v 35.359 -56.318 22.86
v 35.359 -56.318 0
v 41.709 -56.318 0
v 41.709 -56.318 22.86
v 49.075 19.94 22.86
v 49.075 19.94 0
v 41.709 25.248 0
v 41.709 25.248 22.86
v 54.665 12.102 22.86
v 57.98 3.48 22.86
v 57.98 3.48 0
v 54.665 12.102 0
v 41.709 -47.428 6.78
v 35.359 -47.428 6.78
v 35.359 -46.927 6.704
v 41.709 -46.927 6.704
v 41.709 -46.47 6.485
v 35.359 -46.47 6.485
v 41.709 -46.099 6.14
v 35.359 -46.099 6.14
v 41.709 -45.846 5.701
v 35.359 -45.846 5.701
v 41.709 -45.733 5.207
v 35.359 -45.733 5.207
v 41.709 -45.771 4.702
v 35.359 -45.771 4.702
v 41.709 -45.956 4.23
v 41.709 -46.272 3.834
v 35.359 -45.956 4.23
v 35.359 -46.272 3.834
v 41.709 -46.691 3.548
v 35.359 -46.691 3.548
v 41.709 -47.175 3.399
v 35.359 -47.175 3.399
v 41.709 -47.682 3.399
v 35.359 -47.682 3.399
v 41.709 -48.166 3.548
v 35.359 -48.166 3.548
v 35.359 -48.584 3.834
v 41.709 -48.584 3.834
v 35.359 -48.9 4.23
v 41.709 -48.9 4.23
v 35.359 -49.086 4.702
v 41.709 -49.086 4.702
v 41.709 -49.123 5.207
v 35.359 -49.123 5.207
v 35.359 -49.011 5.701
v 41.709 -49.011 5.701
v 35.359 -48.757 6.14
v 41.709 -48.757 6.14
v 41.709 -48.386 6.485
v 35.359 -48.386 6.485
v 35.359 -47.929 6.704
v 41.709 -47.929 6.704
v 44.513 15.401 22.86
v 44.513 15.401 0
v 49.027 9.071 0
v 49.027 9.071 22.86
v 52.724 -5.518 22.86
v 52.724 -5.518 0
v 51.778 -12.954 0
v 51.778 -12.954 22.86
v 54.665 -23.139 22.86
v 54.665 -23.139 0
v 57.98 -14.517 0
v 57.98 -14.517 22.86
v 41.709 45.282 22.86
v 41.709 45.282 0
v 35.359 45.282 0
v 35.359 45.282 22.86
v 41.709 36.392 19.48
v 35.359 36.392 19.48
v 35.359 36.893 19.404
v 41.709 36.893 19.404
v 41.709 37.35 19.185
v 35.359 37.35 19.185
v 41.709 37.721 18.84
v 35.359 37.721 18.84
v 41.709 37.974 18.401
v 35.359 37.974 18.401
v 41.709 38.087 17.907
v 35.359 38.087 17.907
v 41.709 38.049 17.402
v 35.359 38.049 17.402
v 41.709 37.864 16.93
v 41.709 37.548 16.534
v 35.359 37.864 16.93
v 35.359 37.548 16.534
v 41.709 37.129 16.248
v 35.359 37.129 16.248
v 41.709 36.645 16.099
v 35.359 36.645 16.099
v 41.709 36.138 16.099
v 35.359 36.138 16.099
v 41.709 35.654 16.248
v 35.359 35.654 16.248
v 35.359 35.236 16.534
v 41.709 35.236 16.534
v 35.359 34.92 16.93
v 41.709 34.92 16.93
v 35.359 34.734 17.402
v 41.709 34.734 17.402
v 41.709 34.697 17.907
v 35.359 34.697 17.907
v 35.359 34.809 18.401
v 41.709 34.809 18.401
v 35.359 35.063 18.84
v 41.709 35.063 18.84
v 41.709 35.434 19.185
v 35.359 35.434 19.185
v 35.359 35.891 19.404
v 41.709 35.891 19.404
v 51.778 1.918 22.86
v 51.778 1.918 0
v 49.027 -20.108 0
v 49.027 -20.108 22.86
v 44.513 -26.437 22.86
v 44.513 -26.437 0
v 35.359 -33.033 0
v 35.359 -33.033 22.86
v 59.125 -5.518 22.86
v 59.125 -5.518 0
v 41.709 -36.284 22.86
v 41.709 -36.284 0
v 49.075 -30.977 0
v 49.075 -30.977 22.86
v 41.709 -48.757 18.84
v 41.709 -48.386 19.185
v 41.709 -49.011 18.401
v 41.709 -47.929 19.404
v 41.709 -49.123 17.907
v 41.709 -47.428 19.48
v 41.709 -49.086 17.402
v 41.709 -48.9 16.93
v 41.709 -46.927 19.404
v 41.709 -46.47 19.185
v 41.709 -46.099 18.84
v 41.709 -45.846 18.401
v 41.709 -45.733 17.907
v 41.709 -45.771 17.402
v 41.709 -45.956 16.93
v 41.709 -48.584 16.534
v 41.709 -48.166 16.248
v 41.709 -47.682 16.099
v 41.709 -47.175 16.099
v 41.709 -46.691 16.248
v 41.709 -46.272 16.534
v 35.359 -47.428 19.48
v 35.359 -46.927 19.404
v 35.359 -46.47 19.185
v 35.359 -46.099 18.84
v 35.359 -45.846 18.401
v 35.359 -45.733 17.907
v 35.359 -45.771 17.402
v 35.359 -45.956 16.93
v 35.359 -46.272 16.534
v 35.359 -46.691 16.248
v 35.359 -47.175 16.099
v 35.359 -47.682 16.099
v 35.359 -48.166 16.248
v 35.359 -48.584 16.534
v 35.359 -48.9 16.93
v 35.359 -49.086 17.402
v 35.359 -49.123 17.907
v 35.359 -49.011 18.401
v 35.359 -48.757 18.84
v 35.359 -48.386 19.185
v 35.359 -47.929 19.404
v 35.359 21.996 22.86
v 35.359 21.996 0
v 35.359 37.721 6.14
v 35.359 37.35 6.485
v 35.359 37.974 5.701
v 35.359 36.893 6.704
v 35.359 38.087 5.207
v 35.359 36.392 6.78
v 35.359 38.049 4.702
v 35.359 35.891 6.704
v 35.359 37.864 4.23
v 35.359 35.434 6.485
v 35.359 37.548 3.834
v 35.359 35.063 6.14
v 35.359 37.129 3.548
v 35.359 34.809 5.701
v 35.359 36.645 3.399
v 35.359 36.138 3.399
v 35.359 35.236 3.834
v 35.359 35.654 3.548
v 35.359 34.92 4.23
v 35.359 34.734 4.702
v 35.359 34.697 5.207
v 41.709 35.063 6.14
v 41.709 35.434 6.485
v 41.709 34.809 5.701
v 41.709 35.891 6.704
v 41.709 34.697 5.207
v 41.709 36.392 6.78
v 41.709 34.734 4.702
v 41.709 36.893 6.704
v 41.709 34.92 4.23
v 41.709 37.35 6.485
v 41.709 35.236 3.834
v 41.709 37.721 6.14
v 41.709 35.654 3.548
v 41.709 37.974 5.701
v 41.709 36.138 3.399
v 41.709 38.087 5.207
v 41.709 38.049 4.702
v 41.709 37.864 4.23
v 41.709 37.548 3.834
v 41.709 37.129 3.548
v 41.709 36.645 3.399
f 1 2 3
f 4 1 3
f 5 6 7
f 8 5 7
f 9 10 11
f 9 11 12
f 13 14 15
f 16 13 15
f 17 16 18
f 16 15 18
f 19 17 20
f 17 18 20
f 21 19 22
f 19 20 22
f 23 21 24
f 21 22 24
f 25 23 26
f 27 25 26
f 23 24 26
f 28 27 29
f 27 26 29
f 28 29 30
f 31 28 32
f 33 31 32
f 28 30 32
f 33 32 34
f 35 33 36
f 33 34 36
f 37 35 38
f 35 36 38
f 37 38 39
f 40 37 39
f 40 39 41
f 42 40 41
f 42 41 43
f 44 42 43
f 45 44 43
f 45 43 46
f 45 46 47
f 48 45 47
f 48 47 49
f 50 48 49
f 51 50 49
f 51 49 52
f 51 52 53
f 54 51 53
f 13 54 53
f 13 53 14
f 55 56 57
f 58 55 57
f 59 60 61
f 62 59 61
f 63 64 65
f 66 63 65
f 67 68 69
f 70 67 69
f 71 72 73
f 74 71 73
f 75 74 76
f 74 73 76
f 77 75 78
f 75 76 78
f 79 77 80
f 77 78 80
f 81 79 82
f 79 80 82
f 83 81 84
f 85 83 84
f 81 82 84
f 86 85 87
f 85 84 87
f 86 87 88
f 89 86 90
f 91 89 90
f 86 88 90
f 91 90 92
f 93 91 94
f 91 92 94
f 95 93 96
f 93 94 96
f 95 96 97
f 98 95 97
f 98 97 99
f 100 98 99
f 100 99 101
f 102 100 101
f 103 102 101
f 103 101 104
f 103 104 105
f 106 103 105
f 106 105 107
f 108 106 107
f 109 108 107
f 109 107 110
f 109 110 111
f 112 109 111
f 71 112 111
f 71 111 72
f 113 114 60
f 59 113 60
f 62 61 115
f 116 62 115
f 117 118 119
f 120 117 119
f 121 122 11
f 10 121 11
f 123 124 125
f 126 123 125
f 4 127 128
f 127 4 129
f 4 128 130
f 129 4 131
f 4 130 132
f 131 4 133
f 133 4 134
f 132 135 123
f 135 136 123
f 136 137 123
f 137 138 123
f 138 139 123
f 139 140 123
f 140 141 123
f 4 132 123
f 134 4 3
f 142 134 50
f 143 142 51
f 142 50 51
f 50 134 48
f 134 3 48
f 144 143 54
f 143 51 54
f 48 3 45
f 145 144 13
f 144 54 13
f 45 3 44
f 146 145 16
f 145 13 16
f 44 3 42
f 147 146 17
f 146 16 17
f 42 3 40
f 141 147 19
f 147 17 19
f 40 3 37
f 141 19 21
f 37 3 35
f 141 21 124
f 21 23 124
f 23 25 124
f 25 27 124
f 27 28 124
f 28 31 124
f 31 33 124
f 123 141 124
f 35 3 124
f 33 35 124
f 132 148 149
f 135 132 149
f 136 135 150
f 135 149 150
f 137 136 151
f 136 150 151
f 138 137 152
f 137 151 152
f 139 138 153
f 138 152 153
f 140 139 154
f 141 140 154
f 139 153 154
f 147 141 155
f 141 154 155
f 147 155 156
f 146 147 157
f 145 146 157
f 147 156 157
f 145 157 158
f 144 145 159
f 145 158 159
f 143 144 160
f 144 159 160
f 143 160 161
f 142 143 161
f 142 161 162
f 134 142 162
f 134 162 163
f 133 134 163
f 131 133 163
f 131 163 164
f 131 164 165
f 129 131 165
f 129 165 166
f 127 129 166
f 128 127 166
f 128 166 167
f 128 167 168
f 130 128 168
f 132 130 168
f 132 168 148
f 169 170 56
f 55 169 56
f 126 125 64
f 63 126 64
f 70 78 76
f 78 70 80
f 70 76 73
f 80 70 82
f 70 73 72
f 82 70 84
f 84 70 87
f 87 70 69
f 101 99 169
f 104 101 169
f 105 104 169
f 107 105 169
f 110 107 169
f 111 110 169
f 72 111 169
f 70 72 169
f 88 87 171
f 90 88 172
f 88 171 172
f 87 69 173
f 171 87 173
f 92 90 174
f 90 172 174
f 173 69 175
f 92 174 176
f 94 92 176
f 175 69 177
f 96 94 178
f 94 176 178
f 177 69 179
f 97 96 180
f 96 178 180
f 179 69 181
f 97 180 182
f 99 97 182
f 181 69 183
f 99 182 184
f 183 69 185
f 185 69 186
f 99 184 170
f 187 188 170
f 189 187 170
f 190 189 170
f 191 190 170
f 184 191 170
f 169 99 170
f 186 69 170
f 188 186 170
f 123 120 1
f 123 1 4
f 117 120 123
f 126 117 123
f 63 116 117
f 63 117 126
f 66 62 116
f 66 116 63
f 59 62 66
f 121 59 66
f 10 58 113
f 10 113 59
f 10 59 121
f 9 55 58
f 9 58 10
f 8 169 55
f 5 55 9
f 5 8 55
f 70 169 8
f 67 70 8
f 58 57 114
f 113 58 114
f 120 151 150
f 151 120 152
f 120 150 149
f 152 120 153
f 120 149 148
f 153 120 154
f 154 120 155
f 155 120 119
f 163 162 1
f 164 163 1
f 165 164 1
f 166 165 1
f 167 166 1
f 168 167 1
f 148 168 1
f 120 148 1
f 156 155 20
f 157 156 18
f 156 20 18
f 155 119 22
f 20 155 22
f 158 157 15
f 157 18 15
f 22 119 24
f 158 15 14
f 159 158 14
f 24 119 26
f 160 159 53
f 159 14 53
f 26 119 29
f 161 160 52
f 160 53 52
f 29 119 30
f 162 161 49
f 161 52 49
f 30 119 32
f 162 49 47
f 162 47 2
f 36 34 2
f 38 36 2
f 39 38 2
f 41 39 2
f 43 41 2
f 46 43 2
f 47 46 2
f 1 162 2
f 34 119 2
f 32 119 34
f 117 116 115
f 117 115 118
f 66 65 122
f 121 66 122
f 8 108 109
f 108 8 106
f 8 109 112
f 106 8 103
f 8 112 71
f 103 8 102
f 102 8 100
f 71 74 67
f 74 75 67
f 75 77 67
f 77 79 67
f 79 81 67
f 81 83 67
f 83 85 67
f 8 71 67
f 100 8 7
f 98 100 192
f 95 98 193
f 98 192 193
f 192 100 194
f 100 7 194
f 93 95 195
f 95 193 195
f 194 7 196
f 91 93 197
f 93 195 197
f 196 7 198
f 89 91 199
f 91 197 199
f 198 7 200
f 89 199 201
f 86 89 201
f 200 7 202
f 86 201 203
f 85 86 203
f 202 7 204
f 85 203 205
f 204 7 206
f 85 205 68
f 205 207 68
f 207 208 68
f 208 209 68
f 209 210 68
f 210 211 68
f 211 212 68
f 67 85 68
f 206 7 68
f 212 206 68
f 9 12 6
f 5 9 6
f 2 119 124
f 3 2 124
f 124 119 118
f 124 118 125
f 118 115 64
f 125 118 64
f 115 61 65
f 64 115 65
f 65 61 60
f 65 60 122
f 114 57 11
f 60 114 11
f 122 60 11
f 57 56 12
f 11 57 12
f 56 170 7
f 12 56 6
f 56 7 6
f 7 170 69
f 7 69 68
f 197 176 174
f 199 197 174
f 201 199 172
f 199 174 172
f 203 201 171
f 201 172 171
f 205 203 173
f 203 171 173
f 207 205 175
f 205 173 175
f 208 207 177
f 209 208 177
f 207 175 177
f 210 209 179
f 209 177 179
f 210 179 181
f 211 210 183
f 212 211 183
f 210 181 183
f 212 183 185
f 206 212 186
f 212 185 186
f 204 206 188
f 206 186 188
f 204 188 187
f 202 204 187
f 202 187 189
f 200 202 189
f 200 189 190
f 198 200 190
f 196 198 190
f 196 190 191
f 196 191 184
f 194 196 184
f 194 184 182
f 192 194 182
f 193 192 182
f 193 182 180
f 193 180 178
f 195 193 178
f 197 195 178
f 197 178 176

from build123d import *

# Parameters (mm, degrees)
BOSS_EXTRUDE1_DEPTH  = 22.86
M3_CLEARANCE_HOLE1_D = 3.4


with BuildPart() as part:
    # Model → Boss-Extrude1 (new body)
    with BuildSketch(Plane.XY):
        Polygon((35.35946236, 21.996272555), (44.513095611, 15.400697433), (49.027368987, 9.071379605), (51.777733141, 1.917532085), (52.724150942, -5.518132067), (51.777733141, -12.953796218), (49.027368987, -20.107643738), (44.513095611, -26.436961567), (35.35946236, -33.032536689), (35.35946236, -56.318132067), (41.70946236, -56.318132067), (41.70946236, -36.283791365), (49.074837222, -30.976731111), (54.665181836, -23.138688335), (57.980059071, -14.51651143), (59.125380623, -5.518132067), (57.980059071, 3.480247297), (54.665181836, 12.102424201), (49.074837222, 19.940466977), (41.70946236, 25.247527231), (41.70946236, 45.281867933), (35.35946236, 45.281867933), align=None)
    extrude(amount=BOSS_EXTRUDE1_DEPTH)

    # M3 Clearance Hole1 (through all)
    with Locations(Plane(origin=(41.70946236, 0, 0), x_dir=(0, 0, -1), z_dir=(1, 0, 0))):
        with Locations((-17.78, 36.391867933), (-5.08, 36.391867933), (-17.78, -47.428132067), (-5.08, -47.428132067)):
            Hole(M3_CLEARANCE_HOLE1_D / 2)


solid = part.part
